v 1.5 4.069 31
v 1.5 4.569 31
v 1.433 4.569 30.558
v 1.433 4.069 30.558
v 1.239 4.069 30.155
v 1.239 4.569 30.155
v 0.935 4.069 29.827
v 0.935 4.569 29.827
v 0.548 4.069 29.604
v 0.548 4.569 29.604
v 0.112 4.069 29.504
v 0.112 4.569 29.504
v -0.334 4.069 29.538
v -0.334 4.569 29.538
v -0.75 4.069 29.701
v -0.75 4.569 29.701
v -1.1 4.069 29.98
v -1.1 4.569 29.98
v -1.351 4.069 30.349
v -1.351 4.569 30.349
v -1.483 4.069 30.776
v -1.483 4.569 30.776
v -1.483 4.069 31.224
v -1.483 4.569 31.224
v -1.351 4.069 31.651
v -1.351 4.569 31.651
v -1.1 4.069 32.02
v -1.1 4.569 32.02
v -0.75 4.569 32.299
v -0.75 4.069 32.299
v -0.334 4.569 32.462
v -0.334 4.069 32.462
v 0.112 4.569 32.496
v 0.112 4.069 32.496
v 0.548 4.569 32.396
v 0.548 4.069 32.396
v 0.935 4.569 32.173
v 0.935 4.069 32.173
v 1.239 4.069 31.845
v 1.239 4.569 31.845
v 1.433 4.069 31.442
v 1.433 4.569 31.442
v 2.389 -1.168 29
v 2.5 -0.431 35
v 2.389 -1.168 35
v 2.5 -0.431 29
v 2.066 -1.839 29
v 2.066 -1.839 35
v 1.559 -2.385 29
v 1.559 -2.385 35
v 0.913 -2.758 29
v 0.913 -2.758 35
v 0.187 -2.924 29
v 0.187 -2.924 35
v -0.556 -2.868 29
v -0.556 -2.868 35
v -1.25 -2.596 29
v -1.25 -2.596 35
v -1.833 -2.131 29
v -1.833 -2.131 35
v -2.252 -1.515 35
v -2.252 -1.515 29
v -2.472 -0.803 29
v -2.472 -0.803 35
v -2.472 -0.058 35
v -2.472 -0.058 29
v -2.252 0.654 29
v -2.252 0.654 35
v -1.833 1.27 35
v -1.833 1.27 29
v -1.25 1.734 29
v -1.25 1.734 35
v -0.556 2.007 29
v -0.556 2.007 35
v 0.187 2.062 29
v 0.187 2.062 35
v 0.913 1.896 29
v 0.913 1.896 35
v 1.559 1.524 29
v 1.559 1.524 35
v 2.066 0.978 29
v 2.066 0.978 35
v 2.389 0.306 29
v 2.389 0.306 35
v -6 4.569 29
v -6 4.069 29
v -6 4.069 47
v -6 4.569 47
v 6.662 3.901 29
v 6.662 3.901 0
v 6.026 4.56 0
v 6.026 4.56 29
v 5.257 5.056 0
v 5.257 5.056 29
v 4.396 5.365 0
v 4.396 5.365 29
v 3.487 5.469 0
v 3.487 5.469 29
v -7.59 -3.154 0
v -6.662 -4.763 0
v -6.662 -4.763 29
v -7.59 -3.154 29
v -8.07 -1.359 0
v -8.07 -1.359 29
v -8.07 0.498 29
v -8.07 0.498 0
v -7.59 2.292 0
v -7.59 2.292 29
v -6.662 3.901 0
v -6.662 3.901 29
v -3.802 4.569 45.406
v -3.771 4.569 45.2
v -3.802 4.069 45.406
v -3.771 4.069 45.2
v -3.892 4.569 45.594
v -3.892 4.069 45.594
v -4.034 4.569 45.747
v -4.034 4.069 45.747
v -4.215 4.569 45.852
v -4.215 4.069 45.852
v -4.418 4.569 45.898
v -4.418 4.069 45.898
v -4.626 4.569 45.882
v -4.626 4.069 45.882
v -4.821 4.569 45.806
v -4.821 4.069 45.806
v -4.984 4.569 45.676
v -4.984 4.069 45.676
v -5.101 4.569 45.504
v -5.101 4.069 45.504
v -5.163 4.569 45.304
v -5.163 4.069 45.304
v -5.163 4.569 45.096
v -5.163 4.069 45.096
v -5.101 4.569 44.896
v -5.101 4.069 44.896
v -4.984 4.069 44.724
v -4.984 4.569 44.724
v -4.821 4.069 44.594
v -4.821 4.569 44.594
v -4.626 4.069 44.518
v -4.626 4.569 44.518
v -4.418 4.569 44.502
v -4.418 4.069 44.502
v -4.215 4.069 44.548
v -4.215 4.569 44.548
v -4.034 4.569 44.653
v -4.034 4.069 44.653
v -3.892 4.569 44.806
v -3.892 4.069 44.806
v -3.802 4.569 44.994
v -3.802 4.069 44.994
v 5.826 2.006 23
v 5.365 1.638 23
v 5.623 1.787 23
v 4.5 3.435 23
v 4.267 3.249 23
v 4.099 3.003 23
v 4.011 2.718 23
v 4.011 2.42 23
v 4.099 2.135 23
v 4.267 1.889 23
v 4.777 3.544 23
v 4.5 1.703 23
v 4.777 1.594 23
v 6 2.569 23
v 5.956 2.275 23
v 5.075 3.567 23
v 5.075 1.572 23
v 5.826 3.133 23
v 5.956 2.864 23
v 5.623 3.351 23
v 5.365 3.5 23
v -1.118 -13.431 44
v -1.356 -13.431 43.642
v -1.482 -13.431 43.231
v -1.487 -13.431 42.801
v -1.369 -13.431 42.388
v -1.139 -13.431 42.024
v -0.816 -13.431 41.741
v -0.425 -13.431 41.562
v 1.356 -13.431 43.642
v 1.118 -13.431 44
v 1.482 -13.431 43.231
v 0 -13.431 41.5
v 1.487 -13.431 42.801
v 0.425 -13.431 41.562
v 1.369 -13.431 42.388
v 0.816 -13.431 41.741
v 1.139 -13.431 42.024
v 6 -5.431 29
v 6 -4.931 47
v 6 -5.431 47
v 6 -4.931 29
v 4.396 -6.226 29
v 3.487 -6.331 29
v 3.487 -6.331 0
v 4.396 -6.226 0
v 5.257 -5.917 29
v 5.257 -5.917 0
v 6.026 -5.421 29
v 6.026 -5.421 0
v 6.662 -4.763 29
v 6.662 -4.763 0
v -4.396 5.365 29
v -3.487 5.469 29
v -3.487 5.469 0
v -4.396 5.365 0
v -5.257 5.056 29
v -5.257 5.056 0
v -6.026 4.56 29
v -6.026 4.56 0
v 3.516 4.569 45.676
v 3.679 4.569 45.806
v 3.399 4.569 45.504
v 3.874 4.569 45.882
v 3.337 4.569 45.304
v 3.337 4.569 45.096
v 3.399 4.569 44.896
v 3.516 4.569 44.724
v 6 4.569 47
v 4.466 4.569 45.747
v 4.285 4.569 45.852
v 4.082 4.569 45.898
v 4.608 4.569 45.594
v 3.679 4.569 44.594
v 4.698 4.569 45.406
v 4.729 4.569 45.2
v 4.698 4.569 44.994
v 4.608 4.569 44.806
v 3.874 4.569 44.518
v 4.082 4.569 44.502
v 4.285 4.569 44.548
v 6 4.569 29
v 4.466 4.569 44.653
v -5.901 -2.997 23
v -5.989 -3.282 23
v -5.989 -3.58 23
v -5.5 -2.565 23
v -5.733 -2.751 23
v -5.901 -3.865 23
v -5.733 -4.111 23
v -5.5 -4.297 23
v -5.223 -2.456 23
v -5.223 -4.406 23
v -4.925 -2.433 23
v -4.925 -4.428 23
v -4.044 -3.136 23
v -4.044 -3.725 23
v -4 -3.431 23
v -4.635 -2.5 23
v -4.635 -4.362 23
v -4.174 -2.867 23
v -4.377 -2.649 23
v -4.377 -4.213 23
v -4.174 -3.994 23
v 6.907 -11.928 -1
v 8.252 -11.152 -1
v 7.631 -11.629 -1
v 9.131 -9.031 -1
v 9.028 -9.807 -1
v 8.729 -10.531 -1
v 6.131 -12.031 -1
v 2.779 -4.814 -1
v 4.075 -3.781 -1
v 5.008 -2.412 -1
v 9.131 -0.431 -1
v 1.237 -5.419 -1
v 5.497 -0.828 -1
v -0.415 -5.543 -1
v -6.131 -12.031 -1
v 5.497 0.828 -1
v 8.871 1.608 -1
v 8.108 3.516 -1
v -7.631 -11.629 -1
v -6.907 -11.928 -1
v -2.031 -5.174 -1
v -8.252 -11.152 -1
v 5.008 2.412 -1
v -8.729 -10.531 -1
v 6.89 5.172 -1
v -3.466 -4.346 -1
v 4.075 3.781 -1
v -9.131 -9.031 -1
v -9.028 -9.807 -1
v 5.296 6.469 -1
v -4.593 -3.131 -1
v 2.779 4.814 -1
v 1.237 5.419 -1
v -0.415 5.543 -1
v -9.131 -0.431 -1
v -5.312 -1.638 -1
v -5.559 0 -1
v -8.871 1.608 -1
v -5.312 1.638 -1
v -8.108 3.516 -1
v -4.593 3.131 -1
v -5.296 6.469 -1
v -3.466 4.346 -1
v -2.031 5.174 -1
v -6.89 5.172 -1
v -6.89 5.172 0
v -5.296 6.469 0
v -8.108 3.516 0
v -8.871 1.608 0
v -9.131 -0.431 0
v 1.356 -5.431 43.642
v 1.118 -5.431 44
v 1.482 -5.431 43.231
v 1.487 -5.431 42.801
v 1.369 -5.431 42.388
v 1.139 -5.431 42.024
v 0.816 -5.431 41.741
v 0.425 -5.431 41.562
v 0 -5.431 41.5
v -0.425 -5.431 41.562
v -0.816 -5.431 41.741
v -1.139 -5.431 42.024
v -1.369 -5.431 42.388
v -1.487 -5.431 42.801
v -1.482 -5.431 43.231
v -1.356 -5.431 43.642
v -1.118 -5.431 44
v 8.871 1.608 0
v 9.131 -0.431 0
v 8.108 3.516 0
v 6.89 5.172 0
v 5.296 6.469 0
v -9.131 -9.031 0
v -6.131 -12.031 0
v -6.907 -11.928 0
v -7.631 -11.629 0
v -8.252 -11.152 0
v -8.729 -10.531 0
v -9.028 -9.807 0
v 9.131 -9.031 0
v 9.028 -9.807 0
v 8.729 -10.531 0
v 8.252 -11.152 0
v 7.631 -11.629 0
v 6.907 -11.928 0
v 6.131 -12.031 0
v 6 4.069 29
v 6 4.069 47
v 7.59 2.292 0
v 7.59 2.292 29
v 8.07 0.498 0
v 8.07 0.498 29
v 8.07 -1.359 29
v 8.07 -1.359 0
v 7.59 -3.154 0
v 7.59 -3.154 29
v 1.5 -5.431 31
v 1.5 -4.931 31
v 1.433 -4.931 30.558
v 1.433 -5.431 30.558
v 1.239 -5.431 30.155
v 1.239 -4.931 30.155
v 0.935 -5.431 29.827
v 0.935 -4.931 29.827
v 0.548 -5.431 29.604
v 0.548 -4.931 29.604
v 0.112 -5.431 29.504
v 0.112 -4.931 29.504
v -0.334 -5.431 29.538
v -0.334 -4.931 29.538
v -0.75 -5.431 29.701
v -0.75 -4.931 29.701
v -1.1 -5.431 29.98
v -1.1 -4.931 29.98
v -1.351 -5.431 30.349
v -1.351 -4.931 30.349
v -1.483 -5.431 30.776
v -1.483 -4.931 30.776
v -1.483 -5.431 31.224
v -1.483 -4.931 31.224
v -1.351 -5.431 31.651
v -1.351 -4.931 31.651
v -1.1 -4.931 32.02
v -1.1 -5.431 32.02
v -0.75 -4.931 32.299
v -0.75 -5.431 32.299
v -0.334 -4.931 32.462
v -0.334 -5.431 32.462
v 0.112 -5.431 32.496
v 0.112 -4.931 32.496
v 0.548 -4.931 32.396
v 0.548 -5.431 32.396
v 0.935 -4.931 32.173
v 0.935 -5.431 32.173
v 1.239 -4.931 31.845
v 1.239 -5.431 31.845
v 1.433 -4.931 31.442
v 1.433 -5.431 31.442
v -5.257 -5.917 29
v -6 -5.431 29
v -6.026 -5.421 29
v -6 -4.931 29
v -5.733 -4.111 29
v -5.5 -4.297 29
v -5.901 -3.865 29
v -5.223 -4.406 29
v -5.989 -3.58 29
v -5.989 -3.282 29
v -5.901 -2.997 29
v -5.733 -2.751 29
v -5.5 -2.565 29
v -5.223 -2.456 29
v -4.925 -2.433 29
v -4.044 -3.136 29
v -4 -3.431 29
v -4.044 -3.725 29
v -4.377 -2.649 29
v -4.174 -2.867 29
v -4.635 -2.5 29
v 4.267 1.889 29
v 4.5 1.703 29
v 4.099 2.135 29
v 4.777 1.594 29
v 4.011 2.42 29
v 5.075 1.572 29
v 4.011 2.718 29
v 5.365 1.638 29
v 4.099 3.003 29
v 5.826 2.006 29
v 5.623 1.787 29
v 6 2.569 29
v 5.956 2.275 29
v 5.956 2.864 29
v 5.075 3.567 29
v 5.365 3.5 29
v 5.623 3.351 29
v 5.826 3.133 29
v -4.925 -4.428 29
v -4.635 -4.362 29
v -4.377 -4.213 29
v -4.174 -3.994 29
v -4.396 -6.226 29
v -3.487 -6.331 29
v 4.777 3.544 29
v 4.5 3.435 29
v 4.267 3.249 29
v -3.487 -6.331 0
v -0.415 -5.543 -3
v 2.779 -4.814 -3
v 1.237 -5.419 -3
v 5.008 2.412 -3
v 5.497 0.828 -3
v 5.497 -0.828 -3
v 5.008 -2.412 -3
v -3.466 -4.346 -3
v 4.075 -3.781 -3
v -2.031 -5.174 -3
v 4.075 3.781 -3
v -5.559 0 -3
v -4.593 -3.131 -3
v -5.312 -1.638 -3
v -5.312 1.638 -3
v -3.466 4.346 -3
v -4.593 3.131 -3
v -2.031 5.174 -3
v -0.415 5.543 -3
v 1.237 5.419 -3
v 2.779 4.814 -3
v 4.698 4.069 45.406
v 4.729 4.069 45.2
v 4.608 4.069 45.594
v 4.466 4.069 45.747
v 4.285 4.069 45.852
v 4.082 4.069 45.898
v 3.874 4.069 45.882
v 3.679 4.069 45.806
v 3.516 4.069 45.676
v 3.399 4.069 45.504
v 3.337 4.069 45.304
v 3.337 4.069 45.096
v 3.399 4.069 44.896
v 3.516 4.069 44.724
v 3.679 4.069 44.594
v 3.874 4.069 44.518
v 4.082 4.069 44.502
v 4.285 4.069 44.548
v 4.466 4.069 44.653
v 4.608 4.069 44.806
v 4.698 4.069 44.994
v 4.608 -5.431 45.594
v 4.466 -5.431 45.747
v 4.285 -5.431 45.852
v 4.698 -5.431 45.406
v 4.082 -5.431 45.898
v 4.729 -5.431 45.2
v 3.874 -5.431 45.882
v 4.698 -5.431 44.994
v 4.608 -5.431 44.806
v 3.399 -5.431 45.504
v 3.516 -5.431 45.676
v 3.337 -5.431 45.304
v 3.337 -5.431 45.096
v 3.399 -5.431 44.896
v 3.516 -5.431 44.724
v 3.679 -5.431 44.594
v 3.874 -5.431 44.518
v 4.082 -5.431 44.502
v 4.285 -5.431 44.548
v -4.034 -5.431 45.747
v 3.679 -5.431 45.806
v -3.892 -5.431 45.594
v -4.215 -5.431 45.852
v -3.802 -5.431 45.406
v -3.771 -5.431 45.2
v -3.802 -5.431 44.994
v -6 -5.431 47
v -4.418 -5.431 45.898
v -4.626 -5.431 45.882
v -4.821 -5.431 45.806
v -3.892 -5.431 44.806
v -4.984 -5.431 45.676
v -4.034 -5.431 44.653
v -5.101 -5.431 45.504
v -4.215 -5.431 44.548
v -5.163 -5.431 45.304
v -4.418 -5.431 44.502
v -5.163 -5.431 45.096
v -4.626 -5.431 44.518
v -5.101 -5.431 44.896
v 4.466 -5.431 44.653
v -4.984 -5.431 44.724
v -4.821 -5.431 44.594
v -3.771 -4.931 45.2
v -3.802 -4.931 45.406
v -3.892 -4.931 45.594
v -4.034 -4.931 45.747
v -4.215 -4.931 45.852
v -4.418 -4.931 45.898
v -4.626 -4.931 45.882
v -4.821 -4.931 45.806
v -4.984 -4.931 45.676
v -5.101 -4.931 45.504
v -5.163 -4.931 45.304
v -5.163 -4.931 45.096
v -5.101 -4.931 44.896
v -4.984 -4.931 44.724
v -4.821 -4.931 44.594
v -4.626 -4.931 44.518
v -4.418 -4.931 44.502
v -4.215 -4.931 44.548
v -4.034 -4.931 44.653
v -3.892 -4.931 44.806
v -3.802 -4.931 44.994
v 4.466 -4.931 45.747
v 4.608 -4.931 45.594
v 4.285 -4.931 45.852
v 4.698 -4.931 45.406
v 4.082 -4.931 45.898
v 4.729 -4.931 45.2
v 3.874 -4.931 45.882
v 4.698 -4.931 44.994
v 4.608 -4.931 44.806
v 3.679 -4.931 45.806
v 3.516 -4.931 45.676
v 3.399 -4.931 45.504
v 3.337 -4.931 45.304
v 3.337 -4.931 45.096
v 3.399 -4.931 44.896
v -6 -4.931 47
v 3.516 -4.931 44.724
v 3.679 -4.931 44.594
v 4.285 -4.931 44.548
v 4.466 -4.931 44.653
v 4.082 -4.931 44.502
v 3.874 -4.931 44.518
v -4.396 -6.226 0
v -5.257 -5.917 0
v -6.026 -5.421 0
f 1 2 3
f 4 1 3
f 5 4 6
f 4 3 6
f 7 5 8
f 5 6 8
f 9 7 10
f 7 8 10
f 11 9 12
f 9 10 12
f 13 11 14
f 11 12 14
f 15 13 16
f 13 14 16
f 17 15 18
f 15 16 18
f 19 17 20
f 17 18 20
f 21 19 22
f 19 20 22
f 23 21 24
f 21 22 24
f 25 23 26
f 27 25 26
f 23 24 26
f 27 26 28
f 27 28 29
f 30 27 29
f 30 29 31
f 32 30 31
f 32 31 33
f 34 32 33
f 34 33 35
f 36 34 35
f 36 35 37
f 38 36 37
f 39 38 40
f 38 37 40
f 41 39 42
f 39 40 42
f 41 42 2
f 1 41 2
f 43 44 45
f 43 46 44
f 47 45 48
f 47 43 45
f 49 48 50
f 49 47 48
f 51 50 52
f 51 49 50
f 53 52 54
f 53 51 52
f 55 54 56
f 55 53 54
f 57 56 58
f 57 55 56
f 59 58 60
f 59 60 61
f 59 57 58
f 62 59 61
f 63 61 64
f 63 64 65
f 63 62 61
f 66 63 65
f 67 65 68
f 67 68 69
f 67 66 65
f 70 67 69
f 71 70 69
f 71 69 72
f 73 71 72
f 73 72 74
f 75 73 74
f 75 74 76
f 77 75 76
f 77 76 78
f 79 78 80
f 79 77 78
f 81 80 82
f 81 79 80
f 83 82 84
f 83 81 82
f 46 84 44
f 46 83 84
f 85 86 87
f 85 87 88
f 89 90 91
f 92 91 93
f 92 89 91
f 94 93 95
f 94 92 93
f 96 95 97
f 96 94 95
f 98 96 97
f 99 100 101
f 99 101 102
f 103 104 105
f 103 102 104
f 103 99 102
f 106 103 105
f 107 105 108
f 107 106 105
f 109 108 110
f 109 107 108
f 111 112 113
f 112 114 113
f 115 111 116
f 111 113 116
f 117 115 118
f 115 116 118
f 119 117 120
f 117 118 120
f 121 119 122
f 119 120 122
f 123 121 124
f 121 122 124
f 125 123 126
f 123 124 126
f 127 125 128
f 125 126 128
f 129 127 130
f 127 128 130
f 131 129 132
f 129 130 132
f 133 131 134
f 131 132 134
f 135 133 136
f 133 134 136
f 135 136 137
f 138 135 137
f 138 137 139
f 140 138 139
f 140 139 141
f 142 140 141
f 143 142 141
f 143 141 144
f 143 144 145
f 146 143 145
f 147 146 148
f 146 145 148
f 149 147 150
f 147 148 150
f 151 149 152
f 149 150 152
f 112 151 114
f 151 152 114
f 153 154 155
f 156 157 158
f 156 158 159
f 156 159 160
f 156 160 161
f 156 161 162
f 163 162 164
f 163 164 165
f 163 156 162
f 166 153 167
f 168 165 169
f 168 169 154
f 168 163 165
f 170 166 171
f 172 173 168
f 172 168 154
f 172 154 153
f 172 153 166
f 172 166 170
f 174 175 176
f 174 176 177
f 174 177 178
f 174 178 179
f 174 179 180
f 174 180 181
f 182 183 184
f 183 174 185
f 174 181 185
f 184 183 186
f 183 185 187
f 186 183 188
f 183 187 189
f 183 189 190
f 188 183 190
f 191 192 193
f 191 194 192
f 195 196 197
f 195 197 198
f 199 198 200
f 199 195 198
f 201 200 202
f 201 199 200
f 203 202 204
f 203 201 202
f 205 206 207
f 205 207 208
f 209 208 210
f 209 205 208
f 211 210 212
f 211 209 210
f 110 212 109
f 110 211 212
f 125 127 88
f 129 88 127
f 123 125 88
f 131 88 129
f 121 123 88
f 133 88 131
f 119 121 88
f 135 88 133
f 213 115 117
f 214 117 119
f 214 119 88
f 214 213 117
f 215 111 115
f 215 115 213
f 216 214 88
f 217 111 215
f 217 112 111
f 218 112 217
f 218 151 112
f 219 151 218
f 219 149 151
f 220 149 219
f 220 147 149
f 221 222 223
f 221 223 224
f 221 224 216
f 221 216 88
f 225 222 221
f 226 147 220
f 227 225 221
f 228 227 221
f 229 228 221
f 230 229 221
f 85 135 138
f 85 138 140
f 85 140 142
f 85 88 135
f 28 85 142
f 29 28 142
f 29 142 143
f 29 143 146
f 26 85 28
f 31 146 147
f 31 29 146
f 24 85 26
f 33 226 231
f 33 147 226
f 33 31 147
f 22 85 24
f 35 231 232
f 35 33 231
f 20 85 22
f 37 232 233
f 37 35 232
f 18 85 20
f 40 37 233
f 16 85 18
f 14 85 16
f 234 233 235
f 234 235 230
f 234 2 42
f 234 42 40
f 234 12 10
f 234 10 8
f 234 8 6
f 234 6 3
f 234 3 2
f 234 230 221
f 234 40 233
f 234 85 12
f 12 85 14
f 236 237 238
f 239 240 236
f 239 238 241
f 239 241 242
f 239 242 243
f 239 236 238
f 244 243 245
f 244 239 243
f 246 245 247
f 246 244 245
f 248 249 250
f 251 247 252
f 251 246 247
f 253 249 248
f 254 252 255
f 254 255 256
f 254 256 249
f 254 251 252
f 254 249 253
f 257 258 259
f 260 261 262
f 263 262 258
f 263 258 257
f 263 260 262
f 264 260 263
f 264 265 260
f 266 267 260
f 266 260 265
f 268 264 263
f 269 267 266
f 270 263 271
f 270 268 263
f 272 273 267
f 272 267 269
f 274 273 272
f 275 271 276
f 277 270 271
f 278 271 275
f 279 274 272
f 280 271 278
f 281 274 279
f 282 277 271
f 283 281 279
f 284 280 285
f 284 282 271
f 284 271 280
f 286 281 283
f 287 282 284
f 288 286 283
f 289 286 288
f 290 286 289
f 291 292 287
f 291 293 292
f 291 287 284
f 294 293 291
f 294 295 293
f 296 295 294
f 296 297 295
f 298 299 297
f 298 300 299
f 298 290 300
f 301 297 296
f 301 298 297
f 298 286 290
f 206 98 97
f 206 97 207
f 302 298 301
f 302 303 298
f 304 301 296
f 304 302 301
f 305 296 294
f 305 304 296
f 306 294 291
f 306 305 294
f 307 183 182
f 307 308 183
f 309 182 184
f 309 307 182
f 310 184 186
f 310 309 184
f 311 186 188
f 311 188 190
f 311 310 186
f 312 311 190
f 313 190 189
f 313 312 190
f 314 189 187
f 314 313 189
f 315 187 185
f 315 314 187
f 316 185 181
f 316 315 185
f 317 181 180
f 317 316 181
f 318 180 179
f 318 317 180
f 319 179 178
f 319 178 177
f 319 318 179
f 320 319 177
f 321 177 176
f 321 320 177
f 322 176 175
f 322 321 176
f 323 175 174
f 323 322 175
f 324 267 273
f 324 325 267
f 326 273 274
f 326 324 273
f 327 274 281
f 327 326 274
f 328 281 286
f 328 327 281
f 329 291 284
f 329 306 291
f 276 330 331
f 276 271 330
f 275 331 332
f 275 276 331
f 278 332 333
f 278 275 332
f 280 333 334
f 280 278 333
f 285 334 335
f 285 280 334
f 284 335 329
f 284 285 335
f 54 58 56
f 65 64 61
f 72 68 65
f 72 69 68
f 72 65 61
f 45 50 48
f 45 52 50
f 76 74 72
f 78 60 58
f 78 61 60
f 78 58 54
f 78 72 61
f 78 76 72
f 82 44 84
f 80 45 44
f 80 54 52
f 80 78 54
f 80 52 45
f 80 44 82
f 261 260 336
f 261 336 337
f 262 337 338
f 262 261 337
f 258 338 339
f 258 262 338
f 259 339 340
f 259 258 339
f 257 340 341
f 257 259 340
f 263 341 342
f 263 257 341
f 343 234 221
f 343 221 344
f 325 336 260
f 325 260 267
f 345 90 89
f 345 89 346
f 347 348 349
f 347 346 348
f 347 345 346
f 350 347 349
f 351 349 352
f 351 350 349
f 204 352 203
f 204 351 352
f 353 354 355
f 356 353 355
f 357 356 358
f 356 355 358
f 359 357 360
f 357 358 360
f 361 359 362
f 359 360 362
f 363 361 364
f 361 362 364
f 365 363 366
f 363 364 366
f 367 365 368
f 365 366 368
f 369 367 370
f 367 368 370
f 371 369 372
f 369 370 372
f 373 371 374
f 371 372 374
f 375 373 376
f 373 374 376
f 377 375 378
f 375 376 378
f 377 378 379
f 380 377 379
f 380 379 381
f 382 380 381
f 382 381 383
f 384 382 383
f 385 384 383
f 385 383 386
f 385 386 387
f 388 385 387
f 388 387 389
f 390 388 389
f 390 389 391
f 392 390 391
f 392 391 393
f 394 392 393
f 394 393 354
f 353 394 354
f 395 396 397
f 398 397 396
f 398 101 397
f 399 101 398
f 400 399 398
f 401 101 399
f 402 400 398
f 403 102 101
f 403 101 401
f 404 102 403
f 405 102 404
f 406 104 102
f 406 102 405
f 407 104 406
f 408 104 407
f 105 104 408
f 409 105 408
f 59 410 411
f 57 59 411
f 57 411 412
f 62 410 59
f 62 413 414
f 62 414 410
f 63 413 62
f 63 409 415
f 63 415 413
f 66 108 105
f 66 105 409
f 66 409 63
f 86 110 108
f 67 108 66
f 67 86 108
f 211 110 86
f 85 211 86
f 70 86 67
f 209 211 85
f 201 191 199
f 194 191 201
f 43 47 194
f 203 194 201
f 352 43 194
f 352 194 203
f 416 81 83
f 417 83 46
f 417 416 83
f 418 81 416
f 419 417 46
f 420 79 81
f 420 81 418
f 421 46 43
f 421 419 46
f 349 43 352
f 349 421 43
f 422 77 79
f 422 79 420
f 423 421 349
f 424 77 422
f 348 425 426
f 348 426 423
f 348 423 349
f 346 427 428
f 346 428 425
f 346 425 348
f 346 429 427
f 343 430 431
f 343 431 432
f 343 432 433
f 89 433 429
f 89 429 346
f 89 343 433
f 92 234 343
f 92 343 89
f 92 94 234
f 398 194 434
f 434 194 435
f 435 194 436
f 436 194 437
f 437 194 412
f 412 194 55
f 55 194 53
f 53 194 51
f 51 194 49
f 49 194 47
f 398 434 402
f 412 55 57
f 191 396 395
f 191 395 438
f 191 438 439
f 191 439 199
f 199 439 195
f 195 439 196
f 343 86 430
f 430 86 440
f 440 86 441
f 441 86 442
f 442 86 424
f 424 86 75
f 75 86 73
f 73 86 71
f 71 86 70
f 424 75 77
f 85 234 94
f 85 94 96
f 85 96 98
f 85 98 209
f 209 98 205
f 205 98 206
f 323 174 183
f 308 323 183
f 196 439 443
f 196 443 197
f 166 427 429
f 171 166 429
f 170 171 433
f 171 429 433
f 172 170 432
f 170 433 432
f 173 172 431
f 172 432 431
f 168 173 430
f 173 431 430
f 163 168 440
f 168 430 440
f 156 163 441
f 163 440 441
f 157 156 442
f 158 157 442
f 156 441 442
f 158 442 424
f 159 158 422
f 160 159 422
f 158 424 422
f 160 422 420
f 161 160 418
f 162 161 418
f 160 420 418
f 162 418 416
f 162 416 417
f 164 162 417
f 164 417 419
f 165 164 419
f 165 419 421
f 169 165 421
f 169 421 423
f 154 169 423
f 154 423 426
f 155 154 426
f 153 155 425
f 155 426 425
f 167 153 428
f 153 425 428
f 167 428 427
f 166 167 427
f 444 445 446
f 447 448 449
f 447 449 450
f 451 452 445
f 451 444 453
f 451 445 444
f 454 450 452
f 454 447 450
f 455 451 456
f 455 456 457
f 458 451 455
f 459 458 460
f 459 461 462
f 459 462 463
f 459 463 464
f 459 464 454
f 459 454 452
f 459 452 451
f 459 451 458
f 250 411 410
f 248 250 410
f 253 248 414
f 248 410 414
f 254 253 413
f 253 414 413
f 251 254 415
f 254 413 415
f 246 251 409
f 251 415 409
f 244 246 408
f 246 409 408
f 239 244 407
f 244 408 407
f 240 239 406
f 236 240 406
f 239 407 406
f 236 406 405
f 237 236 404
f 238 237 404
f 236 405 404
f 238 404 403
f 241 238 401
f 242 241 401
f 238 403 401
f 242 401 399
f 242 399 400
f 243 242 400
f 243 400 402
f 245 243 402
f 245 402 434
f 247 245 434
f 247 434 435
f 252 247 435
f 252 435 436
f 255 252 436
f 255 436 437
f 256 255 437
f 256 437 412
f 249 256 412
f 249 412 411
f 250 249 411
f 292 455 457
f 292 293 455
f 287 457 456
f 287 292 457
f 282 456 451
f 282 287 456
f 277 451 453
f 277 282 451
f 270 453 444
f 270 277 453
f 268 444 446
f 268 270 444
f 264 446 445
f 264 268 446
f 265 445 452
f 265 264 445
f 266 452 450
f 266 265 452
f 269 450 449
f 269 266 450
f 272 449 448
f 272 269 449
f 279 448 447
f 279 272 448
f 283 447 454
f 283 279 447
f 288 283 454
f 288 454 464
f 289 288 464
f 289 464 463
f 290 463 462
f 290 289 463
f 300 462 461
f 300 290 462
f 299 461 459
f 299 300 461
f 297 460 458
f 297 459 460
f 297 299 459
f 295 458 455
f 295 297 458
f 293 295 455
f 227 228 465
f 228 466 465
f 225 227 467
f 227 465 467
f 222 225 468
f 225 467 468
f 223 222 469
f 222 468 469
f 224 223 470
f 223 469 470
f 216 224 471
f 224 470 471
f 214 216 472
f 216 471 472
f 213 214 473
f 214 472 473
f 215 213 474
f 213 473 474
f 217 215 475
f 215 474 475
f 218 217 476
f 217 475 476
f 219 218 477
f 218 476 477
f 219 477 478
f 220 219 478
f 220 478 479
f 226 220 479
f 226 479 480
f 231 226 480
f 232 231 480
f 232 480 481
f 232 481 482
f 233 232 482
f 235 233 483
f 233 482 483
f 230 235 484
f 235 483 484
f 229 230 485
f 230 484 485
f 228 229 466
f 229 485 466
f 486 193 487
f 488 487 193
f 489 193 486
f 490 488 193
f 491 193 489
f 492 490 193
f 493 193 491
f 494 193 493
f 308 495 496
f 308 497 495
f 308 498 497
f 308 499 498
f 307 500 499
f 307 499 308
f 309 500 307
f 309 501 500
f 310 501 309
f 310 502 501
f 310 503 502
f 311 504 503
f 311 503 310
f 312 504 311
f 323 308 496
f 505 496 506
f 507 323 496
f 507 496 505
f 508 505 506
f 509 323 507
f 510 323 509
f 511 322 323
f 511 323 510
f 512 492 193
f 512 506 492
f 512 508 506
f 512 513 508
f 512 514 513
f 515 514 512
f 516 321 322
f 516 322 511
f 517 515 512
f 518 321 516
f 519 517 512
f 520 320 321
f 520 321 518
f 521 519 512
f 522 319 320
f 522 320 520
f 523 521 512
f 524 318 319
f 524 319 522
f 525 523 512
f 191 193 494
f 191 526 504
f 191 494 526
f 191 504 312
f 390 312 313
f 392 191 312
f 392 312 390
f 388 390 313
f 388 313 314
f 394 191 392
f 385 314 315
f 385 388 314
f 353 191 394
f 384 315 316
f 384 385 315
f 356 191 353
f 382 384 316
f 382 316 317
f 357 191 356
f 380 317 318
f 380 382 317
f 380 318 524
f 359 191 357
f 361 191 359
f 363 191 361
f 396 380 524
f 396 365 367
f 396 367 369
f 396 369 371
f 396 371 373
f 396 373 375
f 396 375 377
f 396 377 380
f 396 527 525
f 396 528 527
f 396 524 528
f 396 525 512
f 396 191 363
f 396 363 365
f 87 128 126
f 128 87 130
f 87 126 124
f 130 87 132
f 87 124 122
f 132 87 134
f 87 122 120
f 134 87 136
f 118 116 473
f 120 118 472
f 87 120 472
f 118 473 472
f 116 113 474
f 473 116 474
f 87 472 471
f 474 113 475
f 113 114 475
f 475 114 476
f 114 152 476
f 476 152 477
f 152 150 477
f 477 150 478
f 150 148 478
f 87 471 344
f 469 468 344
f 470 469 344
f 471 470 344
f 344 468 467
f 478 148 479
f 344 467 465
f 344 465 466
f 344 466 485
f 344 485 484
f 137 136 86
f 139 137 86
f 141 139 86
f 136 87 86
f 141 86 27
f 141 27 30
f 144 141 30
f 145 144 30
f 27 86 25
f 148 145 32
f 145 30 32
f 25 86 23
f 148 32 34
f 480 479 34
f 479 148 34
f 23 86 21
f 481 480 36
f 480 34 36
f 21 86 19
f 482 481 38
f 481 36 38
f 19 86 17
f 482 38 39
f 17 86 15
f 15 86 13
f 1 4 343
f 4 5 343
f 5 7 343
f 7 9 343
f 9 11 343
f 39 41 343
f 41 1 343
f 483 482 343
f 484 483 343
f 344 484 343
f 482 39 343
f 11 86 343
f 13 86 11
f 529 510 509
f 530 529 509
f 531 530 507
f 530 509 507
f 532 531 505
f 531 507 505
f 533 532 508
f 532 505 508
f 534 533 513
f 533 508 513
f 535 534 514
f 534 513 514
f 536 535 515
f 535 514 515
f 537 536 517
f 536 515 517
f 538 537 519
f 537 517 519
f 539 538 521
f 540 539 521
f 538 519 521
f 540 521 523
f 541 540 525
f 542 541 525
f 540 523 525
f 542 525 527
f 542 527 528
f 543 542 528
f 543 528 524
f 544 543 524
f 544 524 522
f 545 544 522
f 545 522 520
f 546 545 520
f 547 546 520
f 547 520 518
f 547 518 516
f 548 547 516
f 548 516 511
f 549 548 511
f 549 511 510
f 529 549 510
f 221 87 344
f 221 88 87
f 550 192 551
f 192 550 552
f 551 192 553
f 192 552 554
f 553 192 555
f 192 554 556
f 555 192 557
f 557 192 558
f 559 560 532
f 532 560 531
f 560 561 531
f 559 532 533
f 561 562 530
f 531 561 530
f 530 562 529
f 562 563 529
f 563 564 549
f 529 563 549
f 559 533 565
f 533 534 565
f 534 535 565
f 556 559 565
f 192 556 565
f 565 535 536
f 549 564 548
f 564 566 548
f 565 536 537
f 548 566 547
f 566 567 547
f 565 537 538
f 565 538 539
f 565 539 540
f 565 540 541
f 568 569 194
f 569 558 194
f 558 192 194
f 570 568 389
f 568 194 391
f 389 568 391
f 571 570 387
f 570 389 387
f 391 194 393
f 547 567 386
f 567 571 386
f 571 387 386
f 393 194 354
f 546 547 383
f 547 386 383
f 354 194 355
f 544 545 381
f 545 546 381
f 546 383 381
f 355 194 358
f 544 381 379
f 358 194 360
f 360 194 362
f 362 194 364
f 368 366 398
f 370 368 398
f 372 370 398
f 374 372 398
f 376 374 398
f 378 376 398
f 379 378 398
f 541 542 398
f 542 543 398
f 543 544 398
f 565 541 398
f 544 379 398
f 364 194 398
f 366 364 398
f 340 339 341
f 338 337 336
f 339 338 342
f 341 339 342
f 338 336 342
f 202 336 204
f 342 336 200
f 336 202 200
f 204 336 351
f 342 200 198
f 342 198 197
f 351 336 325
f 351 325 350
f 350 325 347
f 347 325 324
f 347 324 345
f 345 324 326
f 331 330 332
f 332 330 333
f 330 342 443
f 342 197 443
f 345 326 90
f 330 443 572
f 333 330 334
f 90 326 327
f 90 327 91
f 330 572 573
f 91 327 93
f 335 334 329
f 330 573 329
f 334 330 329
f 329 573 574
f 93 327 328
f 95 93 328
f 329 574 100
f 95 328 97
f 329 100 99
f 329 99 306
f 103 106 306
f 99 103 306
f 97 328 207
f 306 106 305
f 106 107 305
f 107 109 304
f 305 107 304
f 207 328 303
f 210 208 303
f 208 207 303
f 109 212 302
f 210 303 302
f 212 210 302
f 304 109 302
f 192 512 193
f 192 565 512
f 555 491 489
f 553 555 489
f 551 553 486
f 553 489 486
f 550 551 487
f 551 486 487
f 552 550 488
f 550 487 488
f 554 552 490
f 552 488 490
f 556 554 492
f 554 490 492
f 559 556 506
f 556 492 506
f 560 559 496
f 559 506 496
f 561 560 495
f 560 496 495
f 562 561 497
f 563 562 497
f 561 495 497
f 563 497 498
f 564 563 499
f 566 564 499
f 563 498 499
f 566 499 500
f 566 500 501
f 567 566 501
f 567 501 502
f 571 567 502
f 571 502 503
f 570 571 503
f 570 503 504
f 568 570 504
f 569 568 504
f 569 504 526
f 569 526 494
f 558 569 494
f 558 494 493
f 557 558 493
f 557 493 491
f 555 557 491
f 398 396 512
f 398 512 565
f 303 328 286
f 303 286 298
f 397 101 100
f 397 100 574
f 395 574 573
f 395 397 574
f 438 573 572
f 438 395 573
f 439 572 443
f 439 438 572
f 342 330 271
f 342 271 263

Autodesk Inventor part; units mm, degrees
ref_plane "YZ Plane" through (0, 0, 0) normal (1, 0, 0) x (0, 1, 0)
ref_plane "XZ Plane" through (0, 0, 0) normal (0, 1, 0) x (-1, 0, 0)
ref_plane "XY Plane" through (0, 0, 0) normal (0, 0, 1) x (1, 0, 0)
sketch "草图1" plane through (0, 0, 0) normal (0, 0, 1) x (1, 0, 0)
  line L0 (-5, 0) -> (5, 0) construction
  line L1 (-5, -6.3307) -> (5, -6.3307)
  line L2 (5, 5.4693) -> (-5, 5.4693)
  arc A0 (-5, 5.4693) -> (-5, -6.3307) centre (-1.0059, -0.4307) ccw
  line L3 (0, 0) -> (0, 3.0217)
  arc A1 (5, -6.3307) -> (5, 5.4693) centre (1.0059, -0.4307) ccw
  line L4 (5, 5.4693) -> (5, -6.3307)
  line L5 (-5, 5.4693) -> (-5, -6.3307)
  point P0 (-10.9, 0)
  point P1 (10.9, 0)
  point P2 (10.9, 0)
  dimension "d0" = 11.8
  dimension "d6" = 10
extrude "拉伸1" add sketch "草图1" along normal blind 29
sketch "草图2" plane through (0, 0, 29) normal (0, 0, 1) x (1, 0, 0)
  line L0 (6, -5.4307) -> (-6, -5.4307)
  line L1 (-6, -5.4307) -> (-6, 4.5693)
  line L2 (-6, 4.5693) -> (6, 4.5693)
  line L3 (6, 4.5693) -> (6, -5.4307)
  line L4 (6, -5.4307) -> (-6, 4.5693) construction
  line L5 (-6, -5.4307) -> (6, 4.5693) construction
  line L6 (5, 5.4693) -> (-5, 5.4693) projected
  line L7 (0, 5.4693) -> (0, -6.3307)
  line L8 (-5, -6.3307) -> (5, -6.3307) projected
  point P0 (0, -0.4307)
  dimension "d4" = 10
  dimension "d5" = 12
extrude "拉伸2" add sketch "草图2" along normal blind 18
sketch "草图3" plane through (0, 0, 0) normal (0, 0, -1) x (-1, 0, 0)
  line L0 (5, -6.3307) -> (-5, -6.3307) projected
  arc A0 (5, -6.3307) -> (5, 5.4693) centre (1.0059, -0.4307) ccw projected
  line L1 (-5, 5.4693) -> (5, 5.4693) projected
  arc A1 (-5, 5.4693) -> (-5, -6.3307) centre (-1.0059, -0.4307) ccw projected
  arc A2 (5.2957, -7.3307) -> (5.2957, 6.4693) centre (1.0059, -0.4307) ccw
  line L2 (5.2957, -7.3307) -> (-5.2957, -7.3307)
  arc A3 (-5.2957, 6.4693) -> (-5.2957, -7.3307) centre (-1.0059, -0.4307) ccw
  line L3 (-5.2957, 6.4693) -> (5.2957, 6.4693)
  line L4 (-9.1307, -0.4307) -> (9.1307, -0.4307)
  line L5 (9.1307, -0.4307) -> (9.1307, -12.0307)
  line L6 (9.1307, -12.0307) -> (-9.1307, -12.0307)
  line L7 (-9.1307, -12.0307) -> (-9.1307, -0.4307)
  point P0 (0, 0)
  dimension "d9" = 1
  dimension "d10" = 18.5
extrude "拉伸3" add sketch "草图3" along normal blind 1
sketch "草图4" plane through (0, 0, -1) normal (0, 0, -1) x (-1, 0, 0)
  circle A0 centre (0, 0) radius 5.5587
extrude "拉伸4" add sketch "草图4" along normal blind 2
sketch "草图5" plane through (-6, -5.4307, 29) normal (0, 1, 0) x (1, 0, 0)
  circle A0 centre (6, -14) radius 1.5
  line L0 (12, -18) -> (0, -18) projected
  point P0 (6, 29)
  dimension "d15" = 4
  dimension "d16" = 3
extrude "拉伸5" add sketch "草图5" against normal blind 8
sketch "草图7" plane through (0, -13.4307, 43) normal (0, -1, 0) x (1, 0, 0)
  circle A0 centre (0, 0) radius 1.5 projected
  line L0 (-1.118, 1) -> (1.118, 1)
  point P0 (0, -43)
  point P1 (0, 1.5)
  dimension "d19" = 0.5
extrude "拉伸6" cut sketch "草图7" against normal up to surface (8 mm away) contours L0 A0 picked at (-0.0599, 1.1631)
fillet "圆角1" radius 4 4 edges at (-5, 5.4693, 14.5) (5, 5.4693, 14.5) (-5, -6.3307, 14.5) (5, -6.3307, 14.5)
fillet "圆角2" radius 3 2 edges at (-9.1307, -12.0307, -0.5) (9.1307, -12.0307, -0.5)
sketch "草图8" plane through (-6, -5.4307, 29) normal (0, -1, 0) x (1, 0, 0)
  circle A0 centre (10.0294, 16.2) radius 0.7
  circle A1 centre (1.5294, 16.2) radius 0.7
  line L0 (0, 18) -> (12, 18) projected
  point P0 (6, -29)
  dimension "d24" = 1.4
  dimension "d25" = 1.4
  dimension "d26" = 8.5
  dimension "d27" = 1.8
extrude "拉伸7" cut sketch "草图8" against normal blind 11.75
sketch "草图9" plane through (-6, 4.5693, 29) normal (0, 1, 0) x (1, 0, 0)
  line L0 (6, -14) -> (6, -2)
  circle A0 centre (6, -2) radius 1.5
  arc A1 (8.5, -14) -> (3.5, -14) centre (6, -14) ccw projected
  point P0 (6, 29)
  dimension "d30" = 12
  dimension "d31" = 3
extrude "拉伸8" cut sketch "草图9" against normal blind 23
sketch "草图10" plane through (0, 0, 29) normal (0, 0, 1) x (1, 0, 0)
  line L0 (-6, 4.5693) -> (6, 4.5693) projected
  line L1 (0, 4.5693) -> (0, -5.4307)
  line L2 (6, -5.4307) -> (-6, -5.4307) projected
  line L3 (8.5655, -4.9307) -> (-8.5655, -4.9307)
  line L4 (-8.5655, -4.9307) -> (-8.5655, 4.0693)
  line L5 (-8.5655, 4.0693) -> (8.5655, 4.0693)
  line L6 (8.5655, 4.0693) -> (8.5655, -4.9307)
  line L7 (8.5655, -4.9307) -> (-8.5655, 4.0693) construction
  line L8 (-8.5655, -4.9307) -> (8.5655, 4.0693) construction
  point P0 (0, 0)
  point P1 (0, -0.4307)
  dimension "d34" = 0.5
extrude "拉伸9" cut sketch "草图10" along normal blind 39.5
sketch "草图11" plane through (0, 0, 29) normal (0, 0, 1) x (1, 0, 0)
  circle A0 centre (0, -0.4307) radius 2.5
  arc A1 (-6.6623, 3.9014) -> (-6.6623, -4.7629) centre (-1.0059, -0.4307) ccw projected
  line L0 (-8.1307, -0.4307) -> (8.1307, -0.4307)
  arc A2 (6.6623, -4.7629) -> (6.6623, 3.9014) centre (1.0059, -0.4307) ccw projected
  dimension "d37" = 5
extrude "拉伸10" add sketch "草图11" along normal blind 6
sketch "草图12" plane through (0, 0, 29) normal (0, 0, 1) x (1, 0, 0)
  circle A0 centre (0, -0.4307) radius 5.831
  circle A1 centre (5, 2.5693) radius 1
  circle A2 centre (0, -0.4307) radius 5.5587
  line L0 (0, -0.4307) -> (0, 11.5704)
  line L1 (0, -0.4307) -> (0, 11.9593)
  circle A3 centre (-5, 2.5693) radius 1
  line L2 (0, -0.4307) -> (-7.5185, -0.4307)
  circle A4 centre (-5, -3.4307) radius 1
  arc A5 (-6.6623, 3.9014) -> (-6.6623, -4.7629) centre (-1.0059, -0.4307) ccw projected
  line L3 (-8.1307, -0.4307) -> (8.1307, -0.4307)
  arc A6 (6.6623, -4.7629) -> (6.6623, 3.9014) centre (1.0059, -0.4307) ccw projected
  dimension "d40" = 2
  dimension "d41" = 5
  dimension "d42" = 3
extrude "拉伸11" cut sketch "草图12" against normal blind 6 contours A1 A2 A0 | A0 A1 | A4 A0 | A0 A4 A2 | A1 A2 | A2 A4
properties part number "电机"
